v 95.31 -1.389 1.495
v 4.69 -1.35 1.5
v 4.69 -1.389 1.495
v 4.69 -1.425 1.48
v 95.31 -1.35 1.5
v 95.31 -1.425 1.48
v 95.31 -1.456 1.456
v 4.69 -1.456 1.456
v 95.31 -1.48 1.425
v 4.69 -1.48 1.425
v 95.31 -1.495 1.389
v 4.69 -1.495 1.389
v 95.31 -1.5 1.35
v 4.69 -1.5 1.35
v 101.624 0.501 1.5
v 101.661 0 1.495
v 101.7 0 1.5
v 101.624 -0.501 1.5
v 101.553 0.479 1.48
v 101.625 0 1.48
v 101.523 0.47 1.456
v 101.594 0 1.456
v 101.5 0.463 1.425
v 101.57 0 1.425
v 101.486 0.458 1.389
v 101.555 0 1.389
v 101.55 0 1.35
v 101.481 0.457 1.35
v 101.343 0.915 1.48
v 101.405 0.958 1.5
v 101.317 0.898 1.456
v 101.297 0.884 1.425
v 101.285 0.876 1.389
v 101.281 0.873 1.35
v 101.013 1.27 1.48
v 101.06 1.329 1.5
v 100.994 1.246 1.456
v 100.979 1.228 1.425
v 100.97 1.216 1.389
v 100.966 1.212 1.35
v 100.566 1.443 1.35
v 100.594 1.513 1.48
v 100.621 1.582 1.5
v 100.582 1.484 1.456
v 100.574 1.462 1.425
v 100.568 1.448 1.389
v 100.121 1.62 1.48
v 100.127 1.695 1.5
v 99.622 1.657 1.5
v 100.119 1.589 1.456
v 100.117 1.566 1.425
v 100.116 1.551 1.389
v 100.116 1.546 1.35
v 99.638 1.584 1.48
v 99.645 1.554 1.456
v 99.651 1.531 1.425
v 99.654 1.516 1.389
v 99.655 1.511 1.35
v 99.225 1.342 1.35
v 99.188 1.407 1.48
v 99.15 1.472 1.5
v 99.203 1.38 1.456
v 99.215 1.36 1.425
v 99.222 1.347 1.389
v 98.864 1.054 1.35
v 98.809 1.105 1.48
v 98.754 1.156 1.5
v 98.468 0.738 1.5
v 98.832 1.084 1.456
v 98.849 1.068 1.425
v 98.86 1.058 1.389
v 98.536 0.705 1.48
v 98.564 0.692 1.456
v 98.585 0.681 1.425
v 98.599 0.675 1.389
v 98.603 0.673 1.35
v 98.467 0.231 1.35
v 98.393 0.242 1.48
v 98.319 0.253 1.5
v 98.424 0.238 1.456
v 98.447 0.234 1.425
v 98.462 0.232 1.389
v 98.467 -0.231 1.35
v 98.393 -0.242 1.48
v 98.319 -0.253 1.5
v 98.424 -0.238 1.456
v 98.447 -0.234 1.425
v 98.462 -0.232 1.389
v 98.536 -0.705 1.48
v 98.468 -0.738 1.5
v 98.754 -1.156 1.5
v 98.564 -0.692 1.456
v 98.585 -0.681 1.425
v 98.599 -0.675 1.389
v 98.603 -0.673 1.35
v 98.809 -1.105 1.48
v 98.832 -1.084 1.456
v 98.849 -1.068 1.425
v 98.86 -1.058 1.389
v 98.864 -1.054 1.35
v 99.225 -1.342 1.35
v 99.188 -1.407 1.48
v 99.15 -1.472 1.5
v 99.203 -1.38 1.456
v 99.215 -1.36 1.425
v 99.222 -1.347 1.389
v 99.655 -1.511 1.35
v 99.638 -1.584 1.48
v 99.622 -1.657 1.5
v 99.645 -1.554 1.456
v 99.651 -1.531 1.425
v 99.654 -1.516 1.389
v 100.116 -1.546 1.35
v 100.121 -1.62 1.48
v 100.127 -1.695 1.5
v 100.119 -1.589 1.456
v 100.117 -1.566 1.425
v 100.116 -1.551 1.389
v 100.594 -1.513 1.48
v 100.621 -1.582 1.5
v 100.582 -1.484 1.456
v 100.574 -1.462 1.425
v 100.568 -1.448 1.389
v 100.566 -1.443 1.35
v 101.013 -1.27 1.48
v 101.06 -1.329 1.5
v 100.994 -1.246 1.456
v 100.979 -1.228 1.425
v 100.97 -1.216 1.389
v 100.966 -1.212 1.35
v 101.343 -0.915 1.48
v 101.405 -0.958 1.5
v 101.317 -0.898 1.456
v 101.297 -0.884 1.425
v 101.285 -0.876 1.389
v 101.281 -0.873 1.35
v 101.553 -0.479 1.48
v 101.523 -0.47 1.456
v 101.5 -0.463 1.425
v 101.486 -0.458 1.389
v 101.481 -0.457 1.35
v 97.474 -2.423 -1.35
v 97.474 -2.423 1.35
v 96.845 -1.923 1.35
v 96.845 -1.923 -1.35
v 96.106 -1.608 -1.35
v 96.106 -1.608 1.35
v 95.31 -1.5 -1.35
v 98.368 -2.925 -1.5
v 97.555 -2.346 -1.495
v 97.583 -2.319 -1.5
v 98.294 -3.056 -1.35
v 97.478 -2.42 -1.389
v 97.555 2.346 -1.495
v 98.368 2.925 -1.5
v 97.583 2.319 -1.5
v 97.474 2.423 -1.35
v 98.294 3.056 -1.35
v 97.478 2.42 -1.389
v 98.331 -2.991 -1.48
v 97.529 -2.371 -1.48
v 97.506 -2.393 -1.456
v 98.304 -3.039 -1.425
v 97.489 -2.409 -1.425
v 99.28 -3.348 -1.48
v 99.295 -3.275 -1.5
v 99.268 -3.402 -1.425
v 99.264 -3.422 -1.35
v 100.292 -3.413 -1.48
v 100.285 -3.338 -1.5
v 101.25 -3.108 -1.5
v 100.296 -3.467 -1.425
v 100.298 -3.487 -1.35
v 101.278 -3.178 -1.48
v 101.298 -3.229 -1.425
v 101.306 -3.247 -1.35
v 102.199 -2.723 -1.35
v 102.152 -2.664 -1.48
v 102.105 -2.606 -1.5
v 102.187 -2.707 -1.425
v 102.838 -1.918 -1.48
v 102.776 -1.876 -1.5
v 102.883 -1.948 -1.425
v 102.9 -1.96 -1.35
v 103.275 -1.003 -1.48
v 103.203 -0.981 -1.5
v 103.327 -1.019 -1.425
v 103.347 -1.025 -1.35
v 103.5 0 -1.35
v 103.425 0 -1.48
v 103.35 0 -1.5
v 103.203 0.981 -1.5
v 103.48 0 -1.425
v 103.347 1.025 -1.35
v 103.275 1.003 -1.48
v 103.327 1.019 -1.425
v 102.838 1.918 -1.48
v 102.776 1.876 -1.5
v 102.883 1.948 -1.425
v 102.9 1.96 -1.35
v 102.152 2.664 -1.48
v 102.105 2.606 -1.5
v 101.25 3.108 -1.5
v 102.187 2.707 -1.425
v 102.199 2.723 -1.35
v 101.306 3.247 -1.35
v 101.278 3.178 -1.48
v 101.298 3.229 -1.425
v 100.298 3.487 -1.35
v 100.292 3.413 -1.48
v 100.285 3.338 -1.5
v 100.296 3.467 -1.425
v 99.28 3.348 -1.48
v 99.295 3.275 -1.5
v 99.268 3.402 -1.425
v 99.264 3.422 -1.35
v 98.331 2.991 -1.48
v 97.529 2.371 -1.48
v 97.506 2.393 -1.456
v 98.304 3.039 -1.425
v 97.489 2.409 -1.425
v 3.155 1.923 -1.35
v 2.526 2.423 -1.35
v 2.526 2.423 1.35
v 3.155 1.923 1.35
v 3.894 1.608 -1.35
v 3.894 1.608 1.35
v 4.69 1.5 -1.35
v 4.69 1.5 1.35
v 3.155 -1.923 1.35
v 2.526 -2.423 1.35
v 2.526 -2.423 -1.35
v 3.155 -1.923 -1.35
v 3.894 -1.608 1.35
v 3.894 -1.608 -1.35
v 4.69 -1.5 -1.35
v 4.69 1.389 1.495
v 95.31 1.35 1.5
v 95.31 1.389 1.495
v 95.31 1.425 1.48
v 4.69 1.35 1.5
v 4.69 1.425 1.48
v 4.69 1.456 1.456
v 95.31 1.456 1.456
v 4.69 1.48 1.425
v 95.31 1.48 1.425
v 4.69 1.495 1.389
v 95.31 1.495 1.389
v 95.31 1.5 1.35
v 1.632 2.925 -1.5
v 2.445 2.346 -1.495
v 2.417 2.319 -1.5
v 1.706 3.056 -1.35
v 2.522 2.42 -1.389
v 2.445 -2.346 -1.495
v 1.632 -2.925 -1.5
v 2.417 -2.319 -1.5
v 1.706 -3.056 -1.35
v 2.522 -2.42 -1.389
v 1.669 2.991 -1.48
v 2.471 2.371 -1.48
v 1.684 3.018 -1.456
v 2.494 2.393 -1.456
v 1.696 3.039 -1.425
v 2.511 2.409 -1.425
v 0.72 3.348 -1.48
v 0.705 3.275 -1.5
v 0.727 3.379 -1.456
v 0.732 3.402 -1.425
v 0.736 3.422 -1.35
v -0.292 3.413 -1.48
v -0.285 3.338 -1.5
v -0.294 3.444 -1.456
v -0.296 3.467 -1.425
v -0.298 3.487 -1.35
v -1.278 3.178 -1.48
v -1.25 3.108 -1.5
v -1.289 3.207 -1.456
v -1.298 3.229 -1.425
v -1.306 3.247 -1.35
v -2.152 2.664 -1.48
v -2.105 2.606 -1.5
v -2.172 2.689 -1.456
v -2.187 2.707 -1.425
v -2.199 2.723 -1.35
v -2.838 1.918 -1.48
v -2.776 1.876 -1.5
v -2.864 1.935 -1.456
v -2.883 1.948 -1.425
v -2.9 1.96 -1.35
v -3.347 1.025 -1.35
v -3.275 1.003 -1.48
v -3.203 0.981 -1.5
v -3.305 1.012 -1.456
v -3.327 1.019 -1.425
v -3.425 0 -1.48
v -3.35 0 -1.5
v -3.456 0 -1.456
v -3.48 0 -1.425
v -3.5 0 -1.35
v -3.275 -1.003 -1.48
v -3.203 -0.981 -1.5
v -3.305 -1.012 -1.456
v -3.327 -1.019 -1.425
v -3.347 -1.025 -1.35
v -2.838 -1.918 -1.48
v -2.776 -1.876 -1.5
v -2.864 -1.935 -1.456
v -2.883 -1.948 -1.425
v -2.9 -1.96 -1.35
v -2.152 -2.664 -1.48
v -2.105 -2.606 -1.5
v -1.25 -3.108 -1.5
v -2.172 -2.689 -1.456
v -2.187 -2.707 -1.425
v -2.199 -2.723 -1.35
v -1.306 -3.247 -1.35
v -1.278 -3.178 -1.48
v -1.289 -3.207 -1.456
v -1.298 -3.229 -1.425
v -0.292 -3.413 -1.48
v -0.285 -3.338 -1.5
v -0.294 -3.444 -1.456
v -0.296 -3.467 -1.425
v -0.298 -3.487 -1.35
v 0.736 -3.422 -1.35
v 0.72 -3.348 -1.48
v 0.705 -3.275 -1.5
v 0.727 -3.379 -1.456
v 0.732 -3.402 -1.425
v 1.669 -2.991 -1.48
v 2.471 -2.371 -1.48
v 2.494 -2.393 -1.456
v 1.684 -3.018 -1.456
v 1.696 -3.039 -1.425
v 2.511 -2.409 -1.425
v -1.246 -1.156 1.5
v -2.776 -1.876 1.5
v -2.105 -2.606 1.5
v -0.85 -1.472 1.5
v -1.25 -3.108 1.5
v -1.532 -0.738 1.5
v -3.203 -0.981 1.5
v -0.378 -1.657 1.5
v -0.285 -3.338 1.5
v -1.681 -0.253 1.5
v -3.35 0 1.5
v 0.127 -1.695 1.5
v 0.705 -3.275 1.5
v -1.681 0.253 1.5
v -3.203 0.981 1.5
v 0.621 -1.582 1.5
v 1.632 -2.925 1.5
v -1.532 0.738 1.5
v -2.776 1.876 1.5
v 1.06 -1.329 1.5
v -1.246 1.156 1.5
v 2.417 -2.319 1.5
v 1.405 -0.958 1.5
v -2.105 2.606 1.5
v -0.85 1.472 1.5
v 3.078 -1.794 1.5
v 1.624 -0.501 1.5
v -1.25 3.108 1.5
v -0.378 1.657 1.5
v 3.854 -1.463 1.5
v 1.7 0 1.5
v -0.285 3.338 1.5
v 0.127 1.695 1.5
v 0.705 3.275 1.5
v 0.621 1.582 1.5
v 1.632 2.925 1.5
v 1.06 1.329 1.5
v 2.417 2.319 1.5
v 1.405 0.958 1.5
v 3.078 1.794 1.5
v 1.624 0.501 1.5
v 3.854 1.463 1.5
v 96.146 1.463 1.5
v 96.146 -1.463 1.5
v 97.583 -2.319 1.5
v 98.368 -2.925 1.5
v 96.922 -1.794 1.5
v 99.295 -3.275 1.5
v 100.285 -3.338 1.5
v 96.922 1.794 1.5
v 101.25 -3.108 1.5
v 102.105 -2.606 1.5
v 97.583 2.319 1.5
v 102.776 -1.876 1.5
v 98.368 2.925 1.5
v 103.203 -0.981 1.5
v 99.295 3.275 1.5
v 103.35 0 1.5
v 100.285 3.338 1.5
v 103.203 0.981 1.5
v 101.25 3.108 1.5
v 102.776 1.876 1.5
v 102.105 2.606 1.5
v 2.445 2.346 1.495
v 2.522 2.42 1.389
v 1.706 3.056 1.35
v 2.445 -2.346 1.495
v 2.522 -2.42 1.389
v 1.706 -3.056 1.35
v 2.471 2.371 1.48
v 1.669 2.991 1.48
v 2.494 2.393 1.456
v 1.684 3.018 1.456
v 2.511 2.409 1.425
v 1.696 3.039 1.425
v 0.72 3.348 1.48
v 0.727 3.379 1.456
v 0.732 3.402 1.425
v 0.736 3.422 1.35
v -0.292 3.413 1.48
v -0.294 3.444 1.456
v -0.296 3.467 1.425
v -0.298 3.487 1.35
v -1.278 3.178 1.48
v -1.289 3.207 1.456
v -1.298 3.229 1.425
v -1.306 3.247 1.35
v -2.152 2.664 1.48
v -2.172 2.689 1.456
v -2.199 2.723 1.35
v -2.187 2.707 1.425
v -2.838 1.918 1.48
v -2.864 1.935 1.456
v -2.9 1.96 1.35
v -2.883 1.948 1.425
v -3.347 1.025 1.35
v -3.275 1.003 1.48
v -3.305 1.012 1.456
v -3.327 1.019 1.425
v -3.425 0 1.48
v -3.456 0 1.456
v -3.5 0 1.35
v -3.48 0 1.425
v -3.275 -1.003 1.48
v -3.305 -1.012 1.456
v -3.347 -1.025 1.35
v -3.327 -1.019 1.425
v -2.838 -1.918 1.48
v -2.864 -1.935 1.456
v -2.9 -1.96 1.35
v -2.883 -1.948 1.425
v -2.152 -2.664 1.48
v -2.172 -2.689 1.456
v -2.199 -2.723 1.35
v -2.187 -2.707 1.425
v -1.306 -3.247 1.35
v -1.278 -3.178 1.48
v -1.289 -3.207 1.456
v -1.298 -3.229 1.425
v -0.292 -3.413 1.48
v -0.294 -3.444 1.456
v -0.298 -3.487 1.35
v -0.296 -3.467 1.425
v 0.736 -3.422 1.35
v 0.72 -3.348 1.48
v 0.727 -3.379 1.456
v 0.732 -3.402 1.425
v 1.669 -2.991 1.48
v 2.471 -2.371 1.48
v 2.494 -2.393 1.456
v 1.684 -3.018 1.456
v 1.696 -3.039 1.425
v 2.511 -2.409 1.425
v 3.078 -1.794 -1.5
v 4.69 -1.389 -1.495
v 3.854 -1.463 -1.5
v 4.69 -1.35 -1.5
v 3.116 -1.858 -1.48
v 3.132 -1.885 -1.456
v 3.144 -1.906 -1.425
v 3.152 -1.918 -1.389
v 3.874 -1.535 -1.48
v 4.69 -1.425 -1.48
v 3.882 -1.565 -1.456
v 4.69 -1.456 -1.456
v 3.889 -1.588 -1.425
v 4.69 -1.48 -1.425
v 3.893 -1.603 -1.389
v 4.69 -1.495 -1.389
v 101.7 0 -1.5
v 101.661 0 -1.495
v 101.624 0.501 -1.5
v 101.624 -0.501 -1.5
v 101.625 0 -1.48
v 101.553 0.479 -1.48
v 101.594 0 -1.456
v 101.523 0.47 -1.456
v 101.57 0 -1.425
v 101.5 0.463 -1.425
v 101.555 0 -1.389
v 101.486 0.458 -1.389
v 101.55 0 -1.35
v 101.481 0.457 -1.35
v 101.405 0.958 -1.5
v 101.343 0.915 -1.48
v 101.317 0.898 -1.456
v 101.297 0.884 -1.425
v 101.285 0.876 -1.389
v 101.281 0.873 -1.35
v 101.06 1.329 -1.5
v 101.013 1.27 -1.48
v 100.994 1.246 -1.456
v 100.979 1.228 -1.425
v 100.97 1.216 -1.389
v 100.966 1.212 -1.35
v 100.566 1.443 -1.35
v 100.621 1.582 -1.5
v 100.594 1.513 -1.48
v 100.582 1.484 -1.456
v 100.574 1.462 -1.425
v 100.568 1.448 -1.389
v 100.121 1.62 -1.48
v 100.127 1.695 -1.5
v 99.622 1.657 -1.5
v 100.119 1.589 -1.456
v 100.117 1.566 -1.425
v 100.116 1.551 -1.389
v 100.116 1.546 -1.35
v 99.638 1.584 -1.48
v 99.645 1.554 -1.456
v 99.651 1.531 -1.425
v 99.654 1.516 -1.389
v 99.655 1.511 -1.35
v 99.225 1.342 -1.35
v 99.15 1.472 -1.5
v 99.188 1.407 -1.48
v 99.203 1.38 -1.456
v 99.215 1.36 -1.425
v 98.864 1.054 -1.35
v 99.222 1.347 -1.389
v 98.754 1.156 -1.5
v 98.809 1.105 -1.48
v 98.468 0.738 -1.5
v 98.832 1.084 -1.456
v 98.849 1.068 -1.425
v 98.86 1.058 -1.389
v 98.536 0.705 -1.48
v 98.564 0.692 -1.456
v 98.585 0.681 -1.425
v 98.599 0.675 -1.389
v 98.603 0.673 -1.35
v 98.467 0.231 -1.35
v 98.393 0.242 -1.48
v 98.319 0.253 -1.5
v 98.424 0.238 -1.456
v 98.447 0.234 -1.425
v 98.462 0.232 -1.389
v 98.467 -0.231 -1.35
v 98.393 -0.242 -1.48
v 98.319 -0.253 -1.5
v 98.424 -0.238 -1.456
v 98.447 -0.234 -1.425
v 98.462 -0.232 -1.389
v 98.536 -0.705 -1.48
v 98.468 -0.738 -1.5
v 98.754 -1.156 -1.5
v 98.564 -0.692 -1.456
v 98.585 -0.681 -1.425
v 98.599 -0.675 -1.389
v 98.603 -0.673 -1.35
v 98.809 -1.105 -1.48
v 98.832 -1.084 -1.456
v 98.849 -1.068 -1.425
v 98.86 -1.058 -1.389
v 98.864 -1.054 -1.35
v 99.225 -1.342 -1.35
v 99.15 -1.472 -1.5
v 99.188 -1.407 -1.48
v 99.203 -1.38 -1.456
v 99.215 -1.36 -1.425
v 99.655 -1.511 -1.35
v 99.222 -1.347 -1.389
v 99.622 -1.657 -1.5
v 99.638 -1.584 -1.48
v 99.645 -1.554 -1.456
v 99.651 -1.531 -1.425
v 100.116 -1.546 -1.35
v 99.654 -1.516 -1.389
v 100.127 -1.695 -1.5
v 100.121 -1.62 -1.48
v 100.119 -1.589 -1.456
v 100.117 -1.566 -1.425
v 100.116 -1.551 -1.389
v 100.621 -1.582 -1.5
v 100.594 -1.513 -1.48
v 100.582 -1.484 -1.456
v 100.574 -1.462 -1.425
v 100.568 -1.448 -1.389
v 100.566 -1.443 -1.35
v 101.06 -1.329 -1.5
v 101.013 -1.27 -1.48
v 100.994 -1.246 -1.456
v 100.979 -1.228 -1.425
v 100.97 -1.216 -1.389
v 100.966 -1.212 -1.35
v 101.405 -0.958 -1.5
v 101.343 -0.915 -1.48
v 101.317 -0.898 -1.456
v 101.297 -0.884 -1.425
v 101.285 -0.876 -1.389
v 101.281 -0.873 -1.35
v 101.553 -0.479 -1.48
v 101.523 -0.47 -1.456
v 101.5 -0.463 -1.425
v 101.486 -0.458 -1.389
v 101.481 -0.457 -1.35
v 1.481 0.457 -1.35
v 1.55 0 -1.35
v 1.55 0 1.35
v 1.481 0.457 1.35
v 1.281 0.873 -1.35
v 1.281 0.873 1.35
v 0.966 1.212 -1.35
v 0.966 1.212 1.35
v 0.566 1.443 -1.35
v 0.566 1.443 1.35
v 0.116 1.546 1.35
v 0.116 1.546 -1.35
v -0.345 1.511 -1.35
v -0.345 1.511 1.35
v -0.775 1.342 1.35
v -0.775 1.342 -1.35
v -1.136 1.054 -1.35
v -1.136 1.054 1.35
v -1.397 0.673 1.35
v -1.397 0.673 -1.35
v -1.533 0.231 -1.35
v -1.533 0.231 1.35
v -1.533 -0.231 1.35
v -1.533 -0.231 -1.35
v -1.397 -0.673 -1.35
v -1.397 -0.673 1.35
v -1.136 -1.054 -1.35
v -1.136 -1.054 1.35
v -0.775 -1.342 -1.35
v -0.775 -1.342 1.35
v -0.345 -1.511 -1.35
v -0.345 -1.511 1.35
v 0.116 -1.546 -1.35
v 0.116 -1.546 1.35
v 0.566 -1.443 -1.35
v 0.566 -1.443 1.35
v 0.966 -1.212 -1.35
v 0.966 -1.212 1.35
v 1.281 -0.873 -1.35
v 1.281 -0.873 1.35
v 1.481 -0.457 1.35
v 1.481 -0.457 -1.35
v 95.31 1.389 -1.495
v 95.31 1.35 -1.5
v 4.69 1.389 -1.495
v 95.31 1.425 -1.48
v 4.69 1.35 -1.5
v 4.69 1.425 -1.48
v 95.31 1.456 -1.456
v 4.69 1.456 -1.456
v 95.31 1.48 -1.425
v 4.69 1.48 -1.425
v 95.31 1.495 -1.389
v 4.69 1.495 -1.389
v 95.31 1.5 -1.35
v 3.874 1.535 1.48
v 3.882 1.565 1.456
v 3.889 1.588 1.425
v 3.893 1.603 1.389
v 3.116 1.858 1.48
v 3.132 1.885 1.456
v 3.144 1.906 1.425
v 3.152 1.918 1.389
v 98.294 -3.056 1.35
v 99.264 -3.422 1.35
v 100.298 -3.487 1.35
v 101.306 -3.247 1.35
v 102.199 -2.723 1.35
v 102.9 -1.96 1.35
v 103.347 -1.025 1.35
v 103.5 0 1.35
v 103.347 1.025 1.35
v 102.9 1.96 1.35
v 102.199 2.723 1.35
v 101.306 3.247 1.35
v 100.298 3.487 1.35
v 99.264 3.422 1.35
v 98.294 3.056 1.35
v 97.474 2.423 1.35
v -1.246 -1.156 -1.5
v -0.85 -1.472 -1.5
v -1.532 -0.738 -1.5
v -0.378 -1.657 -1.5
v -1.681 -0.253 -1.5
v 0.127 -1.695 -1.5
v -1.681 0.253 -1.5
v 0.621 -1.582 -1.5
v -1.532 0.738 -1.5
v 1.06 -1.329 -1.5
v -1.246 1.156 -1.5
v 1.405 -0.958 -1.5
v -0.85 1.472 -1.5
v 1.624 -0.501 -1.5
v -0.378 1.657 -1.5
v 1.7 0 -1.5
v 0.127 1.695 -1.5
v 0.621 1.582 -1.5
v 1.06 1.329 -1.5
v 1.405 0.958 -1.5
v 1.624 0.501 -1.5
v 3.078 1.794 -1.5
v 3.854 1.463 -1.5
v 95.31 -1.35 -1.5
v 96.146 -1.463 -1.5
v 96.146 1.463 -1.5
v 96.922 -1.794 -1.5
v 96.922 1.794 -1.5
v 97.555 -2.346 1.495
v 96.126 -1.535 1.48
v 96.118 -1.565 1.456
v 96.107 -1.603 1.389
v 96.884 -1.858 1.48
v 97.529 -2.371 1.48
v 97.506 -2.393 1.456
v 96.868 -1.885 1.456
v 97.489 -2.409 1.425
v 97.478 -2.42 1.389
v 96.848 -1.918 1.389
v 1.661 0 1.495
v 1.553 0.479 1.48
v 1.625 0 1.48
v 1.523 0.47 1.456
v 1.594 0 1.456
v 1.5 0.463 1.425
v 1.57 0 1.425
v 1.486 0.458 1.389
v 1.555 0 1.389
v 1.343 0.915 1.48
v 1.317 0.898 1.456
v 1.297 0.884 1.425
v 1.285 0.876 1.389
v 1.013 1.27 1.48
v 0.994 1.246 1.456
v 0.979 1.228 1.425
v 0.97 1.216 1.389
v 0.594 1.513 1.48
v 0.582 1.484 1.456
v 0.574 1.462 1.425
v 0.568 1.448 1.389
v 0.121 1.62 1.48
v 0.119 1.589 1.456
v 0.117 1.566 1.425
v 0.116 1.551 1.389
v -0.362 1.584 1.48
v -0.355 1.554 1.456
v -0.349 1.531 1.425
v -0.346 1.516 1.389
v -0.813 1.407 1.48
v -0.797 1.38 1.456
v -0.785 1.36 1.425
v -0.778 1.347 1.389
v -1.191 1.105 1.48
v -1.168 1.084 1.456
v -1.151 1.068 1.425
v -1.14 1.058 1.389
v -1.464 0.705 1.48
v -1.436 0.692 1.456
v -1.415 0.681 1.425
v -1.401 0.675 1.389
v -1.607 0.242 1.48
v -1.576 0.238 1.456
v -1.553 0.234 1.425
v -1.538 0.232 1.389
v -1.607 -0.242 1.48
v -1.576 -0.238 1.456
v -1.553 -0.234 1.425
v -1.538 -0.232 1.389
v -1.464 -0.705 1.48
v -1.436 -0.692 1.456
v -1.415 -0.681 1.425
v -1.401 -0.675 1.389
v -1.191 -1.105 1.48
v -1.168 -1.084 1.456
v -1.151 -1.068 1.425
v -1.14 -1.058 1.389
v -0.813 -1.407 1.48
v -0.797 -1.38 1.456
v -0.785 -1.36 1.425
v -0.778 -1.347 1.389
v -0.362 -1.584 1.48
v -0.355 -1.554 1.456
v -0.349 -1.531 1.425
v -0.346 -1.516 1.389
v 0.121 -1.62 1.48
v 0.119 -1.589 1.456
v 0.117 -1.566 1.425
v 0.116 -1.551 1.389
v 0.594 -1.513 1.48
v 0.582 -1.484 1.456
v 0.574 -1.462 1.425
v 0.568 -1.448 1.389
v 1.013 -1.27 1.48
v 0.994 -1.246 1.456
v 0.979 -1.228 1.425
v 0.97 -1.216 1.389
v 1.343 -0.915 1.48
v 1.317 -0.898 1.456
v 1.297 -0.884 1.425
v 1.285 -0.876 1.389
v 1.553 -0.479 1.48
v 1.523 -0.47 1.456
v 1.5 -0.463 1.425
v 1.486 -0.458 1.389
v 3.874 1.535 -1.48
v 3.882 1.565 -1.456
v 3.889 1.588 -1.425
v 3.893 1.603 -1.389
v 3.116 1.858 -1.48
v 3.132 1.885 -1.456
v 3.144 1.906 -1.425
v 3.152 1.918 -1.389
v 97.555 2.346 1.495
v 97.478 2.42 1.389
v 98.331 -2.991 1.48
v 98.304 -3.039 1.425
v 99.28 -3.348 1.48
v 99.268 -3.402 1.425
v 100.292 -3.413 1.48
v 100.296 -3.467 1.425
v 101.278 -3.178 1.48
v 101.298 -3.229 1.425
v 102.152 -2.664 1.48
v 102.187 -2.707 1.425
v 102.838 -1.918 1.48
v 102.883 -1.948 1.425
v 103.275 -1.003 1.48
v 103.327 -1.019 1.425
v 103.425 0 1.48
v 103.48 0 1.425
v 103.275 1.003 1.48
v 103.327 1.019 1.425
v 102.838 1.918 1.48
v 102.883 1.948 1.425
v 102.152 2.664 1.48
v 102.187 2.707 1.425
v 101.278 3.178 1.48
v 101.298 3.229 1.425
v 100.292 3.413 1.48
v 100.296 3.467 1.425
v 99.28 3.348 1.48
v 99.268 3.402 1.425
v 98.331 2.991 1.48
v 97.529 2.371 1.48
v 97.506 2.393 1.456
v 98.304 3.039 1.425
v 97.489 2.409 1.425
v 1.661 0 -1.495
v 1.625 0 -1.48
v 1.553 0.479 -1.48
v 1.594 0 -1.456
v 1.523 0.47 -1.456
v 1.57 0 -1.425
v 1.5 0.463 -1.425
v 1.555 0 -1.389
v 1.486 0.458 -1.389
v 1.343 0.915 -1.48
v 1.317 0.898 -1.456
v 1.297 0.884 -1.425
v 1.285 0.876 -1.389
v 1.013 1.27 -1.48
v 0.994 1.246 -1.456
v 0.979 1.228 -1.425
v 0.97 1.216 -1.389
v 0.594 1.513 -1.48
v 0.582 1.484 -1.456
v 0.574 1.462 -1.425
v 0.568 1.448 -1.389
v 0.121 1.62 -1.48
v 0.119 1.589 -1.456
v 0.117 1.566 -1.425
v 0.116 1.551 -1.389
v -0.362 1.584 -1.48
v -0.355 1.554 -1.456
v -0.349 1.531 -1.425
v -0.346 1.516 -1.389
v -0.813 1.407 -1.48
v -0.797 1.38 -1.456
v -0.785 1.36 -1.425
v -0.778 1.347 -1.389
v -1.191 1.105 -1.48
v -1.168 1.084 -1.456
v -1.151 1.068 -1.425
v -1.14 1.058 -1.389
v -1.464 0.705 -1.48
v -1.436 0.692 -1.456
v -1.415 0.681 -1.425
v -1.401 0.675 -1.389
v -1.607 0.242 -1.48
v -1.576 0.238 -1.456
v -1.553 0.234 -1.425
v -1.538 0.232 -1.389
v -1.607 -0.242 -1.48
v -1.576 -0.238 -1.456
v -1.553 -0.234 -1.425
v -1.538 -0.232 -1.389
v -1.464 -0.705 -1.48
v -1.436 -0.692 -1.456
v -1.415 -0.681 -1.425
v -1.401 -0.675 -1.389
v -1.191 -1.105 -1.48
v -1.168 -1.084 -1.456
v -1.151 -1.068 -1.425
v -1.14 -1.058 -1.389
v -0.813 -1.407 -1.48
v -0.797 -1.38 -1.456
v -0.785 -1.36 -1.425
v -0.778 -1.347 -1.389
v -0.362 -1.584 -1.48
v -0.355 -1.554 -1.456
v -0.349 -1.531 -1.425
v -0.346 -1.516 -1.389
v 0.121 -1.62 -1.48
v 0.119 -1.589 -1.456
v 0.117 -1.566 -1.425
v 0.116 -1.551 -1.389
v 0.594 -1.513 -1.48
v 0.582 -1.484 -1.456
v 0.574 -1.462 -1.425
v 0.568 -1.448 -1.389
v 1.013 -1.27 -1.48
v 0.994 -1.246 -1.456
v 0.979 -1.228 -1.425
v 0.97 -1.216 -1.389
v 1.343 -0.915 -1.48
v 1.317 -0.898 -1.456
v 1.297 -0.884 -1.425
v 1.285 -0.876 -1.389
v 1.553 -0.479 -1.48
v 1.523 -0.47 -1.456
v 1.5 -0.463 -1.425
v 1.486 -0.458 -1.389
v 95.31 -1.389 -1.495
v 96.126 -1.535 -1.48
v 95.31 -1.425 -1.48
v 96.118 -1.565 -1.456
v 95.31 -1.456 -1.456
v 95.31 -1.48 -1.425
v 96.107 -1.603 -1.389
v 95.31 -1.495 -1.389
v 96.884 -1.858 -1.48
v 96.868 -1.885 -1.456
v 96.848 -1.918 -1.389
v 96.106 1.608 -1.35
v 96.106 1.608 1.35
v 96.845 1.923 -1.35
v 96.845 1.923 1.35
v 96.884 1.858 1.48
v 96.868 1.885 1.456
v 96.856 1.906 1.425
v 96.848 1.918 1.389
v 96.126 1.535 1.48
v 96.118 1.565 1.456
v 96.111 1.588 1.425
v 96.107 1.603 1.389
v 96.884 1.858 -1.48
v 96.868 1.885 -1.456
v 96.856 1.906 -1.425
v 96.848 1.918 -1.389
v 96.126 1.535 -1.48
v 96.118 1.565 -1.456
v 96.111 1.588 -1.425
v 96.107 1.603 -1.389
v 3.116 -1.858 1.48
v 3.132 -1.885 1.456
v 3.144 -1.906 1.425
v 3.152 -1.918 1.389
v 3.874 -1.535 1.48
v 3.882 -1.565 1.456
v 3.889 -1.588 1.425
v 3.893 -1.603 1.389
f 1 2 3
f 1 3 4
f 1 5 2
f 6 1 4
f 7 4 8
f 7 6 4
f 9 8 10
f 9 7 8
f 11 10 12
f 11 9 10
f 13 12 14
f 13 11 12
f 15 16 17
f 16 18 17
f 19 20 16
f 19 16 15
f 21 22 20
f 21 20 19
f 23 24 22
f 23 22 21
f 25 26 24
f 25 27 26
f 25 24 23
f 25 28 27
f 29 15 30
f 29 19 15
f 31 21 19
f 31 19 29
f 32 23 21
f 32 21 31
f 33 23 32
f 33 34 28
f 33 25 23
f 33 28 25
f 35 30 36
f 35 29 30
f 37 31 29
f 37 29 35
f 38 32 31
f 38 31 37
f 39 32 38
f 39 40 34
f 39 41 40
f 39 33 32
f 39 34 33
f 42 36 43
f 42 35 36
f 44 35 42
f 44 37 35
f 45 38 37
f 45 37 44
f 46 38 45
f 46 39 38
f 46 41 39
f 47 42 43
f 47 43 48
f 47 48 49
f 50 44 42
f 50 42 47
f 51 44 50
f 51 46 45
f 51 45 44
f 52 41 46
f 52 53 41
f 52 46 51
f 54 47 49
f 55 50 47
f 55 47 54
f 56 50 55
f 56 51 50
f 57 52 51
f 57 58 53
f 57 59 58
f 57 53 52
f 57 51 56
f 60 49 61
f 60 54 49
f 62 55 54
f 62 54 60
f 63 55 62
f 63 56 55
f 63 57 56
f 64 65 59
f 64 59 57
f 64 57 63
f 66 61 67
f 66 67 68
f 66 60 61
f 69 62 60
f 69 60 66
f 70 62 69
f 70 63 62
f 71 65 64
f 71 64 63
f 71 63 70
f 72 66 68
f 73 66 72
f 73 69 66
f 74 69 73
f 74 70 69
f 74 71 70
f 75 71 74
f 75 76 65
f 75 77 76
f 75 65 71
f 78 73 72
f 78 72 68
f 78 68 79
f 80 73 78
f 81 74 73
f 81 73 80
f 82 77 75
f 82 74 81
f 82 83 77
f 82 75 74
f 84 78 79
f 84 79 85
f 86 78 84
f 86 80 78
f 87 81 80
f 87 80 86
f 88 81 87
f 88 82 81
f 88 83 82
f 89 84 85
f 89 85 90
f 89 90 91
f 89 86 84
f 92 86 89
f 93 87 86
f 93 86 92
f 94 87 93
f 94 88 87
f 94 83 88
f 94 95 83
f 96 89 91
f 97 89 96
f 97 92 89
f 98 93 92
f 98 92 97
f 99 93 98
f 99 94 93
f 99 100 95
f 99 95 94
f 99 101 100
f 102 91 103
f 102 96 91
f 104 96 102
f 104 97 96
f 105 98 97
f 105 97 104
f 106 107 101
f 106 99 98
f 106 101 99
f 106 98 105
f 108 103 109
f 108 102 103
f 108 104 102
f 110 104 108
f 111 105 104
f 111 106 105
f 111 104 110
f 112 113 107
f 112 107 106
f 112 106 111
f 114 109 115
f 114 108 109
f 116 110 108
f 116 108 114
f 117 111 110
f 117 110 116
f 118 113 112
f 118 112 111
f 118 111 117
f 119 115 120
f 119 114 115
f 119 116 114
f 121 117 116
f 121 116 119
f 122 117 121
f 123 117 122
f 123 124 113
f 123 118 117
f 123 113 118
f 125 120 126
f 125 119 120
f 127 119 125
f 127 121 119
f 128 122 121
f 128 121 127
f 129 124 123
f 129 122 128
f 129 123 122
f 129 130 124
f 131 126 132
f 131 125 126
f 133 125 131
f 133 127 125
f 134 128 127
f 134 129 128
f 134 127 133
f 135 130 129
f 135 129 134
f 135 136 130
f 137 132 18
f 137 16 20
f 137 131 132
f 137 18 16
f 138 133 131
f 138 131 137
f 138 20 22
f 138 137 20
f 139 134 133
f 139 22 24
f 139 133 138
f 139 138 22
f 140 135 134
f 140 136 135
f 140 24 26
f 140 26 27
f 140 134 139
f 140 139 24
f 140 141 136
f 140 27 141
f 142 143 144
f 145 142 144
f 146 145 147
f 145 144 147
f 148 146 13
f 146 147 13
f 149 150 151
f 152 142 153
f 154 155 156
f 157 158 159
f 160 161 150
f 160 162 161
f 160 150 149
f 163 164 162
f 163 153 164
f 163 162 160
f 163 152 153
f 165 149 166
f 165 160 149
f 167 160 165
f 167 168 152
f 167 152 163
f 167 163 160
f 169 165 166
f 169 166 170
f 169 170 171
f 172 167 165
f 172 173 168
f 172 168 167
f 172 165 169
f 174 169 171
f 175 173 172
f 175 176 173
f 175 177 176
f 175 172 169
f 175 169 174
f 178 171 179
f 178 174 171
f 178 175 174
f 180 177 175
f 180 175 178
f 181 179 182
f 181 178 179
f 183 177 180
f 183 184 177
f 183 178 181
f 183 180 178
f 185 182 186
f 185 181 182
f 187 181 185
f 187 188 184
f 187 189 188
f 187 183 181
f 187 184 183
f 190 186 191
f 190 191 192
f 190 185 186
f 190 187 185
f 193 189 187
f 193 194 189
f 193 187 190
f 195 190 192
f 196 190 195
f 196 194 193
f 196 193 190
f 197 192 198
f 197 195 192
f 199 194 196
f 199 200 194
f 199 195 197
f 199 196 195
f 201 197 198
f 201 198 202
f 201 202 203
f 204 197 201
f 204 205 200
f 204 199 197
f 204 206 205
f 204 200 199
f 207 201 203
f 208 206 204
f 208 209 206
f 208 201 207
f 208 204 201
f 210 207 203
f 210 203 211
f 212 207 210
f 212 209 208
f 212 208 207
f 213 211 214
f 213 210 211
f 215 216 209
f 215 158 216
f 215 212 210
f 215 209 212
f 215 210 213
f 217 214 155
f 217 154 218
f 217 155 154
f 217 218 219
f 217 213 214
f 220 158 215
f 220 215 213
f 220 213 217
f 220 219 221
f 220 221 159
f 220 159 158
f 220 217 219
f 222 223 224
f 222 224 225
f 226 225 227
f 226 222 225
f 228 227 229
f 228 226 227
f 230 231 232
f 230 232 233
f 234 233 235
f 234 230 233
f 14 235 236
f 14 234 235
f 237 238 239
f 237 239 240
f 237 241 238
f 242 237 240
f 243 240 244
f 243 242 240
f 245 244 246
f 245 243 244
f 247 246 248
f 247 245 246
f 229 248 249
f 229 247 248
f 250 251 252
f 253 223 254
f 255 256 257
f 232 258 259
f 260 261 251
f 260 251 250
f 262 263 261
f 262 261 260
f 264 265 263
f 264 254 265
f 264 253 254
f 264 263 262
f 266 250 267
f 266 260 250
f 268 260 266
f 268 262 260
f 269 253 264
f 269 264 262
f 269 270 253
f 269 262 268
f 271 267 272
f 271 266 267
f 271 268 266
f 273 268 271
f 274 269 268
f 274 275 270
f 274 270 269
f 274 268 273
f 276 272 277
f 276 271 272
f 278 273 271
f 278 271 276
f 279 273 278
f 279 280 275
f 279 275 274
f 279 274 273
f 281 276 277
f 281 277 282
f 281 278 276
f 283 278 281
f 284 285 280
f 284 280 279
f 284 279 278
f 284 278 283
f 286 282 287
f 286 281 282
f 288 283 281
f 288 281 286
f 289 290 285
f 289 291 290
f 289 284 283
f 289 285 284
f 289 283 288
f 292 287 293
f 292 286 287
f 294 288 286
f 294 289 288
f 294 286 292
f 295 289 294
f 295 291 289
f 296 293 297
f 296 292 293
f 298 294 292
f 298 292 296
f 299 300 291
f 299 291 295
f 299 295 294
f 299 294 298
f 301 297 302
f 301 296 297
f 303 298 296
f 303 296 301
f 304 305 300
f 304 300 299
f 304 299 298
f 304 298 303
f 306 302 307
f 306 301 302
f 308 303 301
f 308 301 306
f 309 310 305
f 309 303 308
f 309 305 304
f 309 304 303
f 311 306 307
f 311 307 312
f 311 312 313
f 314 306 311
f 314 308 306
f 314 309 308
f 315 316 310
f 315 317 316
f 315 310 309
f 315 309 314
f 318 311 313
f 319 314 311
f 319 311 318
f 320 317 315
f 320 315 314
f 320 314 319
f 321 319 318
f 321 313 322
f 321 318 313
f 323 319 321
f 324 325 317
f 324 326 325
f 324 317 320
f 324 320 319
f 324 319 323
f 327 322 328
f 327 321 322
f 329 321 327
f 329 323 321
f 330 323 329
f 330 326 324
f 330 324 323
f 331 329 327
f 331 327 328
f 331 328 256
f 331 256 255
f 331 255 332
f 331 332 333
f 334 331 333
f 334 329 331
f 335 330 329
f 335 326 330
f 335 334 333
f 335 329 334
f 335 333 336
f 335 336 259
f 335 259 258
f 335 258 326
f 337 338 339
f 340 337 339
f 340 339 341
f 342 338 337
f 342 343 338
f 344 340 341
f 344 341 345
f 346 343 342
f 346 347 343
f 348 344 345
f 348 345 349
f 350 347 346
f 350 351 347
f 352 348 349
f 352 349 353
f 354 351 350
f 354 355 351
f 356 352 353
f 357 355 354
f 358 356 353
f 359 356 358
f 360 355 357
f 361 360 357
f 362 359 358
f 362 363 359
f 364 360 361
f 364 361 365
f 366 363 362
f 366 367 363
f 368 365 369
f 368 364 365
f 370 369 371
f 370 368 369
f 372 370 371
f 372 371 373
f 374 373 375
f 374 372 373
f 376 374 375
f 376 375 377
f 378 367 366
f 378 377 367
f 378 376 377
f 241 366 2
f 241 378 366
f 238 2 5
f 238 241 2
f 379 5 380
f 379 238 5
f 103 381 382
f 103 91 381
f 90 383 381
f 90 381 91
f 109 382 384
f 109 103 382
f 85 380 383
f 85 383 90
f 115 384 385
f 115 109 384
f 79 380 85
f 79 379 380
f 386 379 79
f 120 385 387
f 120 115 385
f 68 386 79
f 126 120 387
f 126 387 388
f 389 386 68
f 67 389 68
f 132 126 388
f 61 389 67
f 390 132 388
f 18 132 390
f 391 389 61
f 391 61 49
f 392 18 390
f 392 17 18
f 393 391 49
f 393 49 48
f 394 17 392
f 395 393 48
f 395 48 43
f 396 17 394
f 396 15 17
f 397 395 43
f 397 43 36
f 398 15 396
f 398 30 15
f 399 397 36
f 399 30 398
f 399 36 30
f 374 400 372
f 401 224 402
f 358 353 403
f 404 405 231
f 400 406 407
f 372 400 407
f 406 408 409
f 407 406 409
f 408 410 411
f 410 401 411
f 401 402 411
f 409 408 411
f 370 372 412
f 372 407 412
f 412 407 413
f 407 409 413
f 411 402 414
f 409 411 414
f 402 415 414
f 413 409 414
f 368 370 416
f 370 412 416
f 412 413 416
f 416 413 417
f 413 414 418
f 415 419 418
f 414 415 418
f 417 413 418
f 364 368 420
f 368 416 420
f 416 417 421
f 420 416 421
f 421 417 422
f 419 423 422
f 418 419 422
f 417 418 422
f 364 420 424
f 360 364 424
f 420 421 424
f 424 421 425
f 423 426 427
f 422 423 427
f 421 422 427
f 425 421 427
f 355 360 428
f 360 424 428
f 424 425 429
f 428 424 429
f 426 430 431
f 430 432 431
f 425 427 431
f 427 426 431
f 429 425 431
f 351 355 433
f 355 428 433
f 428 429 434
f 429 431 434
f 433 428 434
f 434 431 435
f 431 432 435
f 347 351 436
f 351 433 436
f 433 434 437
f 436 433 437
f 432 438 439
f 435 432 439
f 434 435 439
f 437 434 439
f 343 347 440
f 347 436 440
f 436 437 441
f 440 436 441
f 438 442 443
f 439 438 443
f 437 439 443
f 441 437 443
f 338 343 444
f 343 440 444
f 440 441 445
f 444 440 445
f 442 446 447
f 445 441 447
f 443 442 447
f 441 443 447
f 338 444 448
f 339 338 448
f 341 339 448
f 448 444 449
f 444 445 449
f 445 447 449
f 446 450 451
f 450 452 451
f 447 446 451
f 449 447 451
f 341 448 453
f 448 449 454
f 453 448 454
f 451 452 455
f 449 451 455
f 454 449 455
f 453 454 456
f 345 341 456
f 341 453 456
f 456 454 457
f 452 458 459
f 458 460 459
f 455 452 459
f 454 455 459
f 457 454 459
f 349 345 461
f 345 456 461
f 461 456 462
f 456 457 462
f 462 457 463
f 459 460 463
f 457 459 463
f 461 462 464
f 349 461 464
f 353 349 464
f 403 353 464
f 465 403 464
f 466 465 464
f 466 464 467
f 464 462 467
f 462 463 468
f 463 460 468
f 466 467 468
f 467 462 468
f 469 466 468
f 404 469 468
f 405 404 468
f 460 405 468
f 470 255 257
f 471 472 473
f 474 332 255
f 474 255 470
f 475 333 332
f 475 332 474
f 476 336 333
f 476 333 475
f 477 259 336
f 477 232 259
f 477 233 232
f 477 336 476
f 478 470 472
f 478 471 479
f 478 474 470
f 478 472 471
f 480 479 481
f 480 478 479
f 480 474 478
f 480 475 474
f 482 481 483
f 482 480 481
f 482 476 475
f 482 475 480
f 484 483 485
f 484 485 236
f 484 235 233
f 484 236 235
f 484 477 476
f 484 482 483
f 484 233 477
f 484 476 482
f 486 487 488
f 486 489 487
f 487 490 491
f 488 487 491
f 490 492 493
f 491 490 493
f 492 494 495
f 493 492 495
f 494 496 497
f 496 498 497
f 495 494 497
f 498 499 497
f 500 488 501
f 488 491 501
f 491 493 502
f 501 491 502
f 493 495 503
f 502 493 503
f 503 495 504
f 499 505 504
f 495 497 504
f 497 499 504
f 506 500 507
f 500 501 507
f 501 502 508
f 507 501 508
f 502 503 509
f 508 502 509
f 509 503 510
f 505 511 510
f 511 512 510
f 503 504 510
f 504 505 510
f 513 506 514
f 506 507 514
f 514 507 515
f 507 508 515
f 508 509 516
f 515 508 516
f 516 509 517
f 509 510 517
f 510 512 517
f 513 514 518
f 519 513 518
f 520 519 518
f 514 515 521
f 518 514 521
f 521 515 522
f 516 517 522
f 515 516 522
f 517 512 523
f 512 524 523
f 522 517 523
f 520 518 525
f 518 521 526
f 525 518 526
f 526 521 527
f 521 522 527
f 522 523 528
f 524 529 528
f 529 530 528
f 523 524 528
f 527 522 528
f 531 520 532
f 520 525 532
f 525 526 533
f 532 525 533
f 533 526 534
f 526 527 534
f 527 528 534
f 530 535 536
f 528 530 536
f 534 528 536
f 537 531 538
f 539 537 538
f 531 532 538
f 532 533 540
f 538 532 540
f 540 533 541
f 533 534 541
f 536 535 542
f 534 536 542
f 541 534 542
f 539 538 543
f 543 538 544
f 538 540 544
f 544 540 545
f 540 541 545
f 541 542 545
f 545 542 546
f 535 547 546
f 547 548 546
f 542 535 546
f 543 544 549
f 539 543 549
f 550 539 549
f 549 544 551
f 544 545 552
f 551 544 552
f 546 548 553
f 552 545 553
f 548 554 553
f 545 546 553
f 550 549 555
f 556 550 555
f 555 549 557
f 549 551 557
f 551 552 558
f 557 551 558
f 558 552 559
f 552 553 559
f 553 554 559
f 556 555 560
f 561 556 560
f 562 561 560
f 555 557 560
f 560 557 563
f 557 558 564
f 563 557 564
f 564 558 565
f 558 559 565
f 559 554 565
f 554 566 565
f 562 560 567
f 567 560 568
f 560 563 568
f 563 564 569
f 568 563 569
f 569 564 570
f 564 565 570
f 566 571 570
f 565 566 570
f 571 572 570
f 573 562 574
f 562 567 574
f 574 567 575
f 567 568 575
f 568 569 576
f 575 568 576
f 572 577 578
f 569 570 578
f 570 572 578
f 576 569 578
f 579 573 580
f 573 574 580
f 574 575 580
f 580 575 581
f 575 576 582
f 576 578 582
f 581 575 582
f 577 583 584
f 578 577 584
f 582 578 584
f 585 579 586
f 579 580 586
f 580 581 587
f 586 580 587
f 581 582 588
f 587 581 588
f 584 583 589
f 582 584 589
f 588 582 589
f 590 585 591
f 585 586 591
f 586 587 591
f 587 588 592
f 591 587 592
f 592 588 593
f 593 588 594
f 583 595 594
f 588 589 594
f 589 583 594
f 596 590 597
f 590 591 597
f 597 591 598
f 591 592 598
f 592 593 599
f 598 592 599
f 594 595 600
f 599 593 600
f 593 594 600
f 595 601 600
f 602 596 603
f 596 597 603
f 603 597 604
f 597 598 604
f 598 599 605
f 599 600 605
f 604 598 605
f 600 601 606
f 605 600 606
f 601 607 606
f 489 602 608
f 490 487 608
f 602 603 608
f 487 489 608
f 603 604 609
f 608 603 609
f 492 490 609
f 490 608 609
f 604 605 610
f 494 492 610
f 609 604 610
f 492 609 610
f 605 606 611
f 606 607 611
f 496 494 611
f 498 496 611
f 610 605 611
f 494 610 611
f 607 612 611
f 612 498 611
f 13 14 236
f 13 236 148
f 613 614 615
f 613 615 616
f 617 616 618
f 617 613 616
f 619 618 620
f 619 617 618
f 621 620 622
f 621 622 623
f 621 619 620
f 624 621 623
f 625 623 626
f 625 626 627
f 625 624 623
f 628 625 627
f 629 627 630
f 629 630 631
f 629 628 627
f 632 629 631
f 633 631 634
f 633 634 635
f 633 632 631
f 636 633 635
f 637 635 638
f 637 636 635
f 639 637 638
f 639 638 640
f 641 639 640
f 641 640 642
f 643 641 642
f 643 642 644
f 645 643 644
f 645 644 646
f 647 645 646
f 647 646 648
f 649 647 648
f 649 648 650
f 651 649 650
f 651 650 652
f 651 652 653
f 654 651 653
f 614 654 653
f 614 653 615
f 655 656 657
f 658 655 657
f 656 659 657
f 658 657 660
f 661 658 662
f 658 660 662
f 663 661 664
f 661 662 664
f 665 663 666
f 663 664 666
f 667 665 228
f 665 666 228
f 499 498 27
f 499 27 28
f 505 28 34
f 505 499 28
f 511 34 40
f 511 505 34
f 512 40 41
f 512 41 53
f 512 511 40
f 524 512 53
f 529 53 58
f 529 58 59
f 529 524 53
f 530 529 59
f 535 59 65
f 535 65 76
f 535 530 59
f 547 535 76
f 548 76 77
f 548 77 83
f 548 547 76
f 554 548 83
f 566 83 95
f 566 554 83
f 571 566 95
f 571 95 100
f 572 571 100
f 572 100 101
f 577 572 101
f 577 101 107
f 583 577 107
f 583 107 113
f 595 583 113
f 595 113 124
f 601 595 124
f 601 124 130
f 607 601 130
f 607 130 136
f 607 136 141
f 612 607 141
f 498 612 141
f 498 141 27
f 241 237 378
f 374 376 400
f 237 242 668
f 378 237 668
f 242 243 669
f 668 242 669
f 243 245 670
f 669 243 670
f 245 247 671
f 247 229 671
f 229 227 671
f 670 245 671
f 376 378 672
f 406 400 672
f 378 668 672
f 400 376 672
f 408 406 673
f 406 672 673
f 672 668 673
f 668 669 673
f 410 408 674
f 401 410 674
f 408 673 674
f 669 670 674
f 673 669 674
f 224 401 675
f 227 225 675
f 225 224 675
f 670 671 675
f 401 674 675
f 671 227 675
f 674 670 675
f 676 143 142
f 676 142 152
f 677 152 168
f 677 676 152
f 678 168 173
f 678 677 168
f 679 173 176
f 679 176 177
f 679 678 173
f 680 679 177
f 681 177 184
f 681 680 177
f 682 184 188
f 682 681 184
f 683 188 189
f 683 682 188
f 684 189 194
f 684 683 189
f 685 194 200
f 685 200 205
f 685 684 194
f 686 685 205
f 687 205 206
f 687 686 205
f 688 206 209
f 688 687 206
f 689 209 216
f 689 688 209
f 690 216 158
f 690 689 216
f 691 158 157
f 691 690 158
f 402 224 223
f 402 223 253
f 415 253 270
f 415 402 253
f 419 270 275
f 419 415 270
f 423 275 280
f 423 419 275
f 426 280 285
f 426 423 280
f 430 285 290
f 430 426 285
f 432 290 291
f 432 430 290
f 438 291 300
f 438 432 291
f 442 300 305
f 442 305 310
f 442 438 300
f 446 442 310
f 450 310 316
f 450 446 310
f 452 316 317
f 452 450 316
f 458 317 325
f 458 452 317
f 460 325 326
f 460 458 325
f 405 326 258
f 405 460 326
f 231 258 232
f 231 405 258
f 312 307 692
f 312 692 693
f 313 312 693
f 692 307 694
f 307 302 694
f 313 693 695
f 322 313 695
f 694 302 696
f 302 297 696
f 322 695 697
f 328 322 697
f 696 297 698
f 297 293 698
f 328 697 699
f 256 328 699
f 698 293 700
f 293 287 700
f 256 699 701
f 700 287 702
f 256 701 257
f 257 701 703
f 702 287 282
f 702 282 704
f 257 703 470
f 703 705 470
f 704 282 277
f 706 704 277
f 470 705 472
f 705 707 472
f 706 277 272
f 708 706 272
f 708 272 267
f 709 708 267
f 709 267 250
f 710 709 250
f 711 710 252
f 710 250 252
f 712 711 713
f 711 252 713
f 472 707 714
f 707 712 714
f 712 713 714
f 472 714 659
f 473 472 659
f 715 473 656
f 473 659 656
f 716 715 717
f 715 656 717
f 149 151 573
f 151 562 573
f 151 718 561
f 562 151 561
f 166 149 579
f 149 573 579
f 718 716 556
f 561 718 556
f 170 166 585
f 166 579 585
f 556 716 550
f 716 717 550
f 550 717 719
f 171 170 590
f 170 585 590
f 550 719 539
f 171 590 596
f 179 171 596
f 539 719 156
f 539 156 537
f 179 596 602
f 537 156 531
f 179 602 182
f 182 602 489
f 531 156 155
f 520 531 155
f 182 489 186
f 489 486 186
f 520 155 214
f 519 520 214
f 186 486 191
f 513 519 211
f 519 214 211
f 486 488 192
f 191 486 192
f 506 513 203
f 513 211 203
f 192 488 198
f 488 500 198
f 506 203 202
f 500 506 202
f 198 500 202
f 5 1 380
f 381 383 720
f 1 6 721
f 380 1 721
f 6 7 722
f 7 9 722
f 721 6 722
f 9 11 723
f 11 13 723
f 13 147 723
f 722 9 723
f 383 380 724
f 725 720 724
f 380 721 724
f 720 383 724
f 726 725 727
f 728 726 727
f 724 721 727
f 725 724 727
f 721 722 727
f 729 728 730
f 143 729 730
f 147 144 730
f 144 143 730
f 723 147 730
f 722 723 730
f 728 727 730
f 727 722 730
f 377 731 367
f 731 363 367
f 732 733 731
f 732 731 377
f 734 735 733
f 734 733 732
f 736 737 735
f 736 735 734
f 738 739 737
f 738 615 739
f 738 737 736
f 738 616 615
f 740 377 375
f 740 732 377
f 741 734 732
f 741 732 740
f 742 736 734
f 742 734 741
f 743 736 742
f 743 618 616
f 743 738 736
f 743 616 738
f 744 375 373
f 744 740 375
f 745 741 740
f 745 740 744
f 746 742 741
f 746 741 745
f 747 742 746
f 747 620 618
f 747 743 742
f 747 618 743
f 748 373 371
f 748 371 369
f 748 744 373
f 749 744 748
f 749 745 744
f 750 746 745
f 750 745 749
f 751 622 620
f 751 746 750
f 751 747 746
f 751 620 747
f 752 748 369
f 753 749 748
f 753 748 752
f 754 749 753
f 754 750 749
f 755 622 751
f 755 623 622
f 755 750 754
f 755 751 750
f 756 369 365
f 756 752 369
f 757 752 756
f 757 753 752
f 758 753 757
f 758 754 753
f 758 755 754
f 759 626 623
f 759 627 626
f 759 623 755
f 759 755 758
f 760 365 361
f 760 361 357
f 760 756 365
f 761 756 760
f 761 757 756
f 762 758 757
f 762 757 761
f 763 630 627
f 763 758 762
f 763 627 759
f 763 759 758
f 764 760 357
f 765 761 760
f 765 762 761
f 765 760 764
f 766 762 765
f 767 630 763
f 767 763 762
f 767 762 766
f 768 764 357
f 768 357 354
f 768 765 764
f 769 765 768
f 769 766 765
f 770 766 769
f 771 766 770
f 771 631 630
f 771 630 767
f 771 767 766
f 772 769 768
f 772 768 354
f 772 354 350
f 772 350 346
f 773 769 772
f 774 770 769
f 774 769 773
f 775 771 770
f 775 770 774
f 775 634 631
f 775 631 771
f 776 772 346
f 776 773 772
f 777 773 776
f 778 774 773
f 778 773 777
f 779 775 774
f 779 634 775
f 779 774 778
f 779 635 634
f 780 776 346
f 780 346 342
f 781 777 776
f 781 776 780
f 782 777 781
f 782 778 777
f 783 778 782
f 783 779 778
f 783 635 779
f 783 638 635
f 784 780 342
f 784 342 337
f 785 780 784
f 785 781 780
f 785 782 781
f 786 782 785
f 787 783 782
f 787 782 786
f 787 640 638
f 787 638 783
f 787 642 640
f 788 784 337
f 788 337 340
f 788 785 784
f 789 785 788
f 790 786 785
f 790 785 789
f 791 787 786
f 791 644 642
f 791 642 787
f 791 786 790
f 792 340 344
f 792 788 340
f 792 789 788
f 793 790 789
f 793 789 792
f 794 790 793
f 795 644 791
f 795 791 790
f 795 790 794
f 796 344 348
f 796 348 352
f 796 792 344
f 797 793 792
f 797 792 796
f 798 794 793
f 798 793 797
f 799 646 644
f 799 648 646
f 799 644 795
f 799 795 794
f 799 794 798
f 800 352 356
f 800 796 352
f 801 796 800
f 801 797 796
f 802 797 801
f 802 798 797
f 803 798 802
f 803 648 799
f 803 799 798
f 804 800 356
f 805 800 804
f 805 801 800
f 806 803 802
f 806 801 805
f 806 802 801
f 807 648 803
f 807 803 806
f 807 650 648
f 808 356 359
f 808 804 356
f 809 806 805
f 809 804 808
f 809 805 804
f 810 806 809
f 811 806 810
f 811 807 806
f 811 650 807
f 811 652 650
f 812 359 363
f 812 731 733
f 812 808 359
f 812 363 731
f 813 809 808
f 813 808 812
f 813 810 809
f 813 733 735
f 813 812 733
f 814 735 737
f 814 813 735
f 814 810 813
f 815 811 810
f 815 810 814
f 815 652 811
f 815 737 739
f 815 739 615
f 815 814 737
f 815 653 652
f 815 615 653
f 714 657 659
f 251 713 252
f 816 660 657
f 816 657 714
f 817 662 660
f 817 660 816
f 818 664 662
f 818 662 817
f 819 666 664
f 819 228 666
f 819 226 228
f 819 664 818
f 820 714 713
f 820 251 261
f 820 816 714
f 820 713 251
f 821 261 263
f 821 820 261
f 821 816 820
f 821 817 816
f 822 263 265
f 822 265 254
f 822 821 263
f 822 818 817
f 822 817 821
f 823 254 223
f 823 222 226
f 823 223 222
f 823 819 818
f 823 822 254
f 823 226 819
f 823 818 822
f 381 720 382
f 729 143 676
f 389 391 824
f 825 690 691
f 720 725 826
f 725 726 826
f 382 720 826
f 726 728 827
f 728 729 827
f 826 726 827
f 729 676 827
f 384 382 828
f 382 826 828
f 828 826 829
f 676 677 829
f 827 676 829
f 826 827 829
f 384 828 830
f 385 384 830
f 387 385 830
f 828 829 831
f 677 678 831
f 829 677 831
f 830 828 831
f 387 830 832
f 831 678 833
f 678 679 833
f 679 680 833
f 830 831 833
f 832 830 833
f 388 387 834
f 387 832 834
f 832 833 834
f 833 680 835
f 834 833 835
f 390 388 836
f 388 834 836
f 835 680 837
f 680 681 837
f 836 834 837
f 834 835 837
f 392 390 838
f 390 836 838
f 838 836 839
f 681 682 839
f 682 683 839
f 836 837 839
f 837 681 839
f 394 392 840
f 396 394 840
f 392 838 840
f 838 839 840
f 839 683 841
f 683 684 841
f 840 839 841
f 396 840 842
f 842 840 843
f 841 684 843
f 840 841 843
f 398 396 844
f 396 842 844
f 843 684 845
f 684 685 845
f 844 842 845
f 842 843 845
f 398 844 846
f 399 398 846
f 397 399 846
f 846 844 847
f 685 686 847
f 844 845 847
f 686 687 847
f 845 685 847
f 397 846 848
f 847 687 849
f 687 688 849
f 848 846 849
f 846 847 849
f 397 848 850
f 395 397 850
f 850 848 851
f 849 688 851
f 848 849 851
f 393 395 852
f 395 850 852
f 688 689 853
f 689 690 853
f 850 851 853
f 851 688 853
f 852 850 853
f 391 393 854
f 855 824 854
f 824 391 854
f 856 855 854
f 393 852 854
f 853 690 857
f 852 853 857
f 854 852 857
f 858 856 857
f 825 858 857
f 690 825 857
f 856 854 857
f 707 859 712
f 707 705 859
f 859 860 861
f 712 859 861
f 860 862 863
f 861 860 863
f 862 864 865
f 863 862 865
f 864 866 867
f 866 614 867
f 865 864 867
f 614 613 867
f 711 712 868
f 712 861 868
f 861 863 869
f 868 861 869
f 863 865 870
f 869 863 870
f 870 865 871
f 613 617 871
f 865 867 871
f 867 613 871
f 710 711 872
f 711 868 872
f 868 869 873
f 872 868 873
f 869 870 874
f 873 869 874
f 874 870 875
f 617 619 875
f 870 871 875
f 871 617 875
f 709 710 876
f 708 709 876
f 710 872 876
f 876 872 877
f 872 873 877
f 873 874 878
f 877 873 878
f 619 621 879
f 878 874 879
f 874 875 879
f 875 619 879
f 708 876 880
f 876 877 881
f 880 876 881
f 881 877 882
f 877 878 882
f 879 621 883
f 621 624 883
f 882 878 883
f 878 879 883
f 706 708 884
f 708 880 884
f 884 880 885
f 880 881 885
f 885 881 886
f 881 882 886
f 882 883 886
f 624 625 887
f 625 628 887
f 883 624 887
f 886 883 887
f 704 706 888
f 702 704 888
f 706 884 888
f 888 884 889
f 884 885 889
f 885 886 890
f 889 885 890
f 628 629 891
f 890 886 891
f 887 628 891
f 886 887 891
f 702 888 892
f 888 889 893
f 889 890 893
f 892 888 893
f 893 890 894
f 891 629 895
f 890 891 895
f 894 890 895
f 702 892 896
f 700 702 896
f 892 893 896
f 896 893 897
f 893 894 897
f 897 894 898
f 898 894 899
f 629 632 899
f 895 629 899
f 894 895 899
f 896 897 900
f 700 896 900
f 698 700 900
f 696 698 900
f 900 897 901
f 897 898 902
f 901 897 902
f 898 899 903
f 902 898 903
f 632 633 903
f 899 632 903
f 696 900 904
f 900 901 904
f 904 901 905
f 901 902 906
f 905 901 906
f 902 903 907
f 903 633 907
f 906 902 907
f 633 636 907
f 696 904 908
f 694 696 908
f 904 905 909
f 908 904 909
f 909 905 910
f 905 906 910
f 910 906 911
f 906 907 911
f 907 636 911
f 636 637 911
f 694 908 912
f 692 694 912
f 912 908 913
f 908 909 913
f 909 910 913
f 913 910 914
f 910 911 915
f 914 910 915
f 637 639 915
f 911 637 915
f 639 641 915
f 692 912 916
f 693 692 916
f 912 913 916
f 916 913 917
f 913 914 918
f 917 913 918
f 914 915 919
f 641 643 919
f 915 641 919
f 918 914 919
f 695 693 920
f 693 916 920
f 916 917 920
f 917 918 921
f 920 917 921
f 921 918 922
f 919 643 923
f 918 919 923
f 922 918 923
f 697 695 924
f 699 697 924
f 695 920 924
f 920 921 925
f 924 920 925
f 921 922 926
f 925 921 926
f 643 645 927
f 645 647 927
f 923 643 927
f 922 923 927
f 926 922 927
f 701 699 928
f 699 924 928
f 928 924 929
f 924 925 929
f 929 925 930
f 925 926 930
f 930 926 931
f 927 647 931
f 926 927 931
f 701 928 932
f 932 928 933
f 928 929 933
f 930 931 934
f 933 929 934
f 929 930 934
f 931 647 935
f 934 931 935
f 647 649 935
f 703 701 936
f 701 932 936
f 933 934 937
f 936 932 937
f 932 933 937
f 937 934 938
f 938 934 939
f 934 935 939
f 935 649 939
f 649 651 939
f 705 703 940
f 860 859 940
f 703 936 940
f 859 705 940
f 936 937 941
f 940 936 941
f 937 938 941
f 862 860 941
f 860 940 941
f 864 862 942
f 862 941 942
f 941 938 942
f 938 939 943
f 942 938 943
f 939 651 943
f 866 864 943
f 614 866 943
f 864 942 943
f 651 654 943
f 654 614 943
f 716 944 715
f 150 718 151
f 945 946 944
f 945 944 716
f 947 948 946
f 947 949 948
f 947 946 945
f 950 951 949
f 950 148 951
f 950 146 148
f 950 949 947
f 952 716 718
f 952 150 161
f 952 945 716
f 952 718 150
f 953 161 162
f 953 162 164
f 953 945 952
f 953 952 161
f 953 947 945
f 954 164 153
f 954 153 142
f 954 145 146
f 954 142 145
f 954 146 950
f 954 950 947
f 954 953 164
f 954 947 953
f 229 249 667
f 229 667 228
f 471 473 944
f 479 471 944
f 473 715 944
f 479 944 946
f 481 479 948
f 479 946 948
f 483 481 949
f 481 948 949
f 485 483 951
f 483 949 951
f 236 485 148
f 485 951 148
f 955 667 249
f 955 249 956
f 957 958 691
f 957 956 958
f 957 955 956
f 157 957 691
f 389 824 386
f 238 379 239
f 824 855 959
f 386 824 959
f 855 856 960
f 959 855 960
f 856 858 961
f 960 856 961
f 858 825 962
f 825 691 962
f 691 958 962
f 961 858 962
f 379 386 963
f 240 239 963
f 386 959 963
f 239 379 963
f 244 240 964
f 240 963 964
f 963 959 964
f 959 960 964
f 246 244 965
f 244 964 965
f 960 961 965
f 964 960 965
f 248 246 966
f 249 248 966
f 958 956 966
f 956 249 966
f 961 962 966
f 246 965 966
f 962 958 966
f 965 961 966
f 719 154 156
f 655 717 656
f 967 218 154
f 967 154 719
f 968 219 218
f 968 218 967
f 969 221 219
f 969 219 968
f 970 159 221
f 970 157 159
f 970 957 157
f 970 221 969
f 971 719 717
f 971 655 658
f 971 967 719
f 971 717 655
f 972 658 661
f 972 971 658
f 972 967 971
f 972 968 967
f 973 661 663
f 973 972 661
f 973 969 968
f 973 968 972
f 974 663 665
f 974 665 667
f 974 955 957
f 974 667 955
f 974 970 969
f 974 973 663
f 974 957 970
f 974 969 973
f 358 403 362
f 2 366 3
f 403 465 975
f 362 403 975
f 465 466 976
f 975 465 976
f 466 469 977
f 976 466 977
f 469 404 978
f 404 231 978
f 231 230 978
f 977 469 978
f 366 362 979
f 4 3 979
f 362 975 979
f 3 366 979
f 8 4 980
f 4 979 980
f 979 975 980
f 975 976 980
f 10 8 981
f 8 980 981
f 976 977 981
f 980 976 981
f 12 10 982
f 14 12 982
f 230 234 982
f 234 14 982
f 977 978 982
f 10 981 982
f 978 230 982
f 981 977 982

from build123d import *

# Parameters (mm, degrees)
SKETCH1_R           = 3.5
SKETCH1_R_2         = 1.55
BOSS_EXTRUDE1_DEPTH = 1.5
FILLET1_R           = 3
FILLET3_R           = 0.15


with BuildPart() as part:
    # Sketch1 → Boss-Extrude1 (new body, symmetric)
    with BuildSketch(Plane.XY):
        Circle(SKETCH1_R)
        Circle(SKETCH1_R_2, mode=Mode.SUBTRACT)
        with BuildLine():
            Line((3.16227766, -1.5), (96.83772234, -1.5))
            ThreePointArc((96.83772234, -1.5), (96.5, 0), (96.83772234, 1.5))
            Line((96.83772234, 1.5), (3.16227766, 1.5))
            ThreePointArc((3.16227766, 1.5), (3.414525722, 0.768774411), (3.5, 0))
            ThreePointArc((3.5, 0), (3.414525722, -0.768774411), (3.16227766, -1.5))
        make_face()
        with Locations((100, 0)):
            Circle(SKETCH1_R)
        with Locations((100, 0)):
            Circle(SKETCH1_R_2, mode=Mode.SUBTRACT)
    extrude(amount=BOSS_EXTRUDE1_DEPTH, both=True)

    # Fillet1
    fillet1_edges = [part.edges().sort_by_distance(p)[0] for p in [
        (96.83772234, 1.5, 0),
        (96.83772234, -1.5, 0),
        (3.16227766, -1.5, 0),
        (3.16227766, 1.5, 0),
    ]]
    fillet(fillet1_edges, radius=FILLET1_R)

    # Fillet3
    fillet3_edges = [part.edges().sort_by_distance(p)[0] for p in [
        (103.5, 0, -1.5),
        (-1.55, 0, 1.5),
        (103.5, 0, 1.5),
        (50, -1.5, -1.5),
        (50, -1.5, 1.5),
        (98.45, 0, 1.5),
        (-3.5, 0, -1.5),
        (-3.5, 0, 1.5),
        (50, 1.5, -1.5),
        (50, 1.5, 1.5),
        (96.486281051, -1.740401367, -1.5),
        (96.486281051, -1.740401367, 1.5),
        (3.513718949, -1.740401367, -1.5),
        (3.513718949, -1.740401367, 1.5),
        (96.486281051, 1.740401367, -1.5),
        (96.486281051, 1.740401367, 1.5),
        (3.513718949, 1.740401367, -1.5),
        (3.513718949, 1.740401367, 1.5),
        (98.45, 0, -1.5),
        (-1.55, 0, -1.5),
    ]]
    fillet(fillet3_edges, radius=FILLET3_R)


solid = part.part
